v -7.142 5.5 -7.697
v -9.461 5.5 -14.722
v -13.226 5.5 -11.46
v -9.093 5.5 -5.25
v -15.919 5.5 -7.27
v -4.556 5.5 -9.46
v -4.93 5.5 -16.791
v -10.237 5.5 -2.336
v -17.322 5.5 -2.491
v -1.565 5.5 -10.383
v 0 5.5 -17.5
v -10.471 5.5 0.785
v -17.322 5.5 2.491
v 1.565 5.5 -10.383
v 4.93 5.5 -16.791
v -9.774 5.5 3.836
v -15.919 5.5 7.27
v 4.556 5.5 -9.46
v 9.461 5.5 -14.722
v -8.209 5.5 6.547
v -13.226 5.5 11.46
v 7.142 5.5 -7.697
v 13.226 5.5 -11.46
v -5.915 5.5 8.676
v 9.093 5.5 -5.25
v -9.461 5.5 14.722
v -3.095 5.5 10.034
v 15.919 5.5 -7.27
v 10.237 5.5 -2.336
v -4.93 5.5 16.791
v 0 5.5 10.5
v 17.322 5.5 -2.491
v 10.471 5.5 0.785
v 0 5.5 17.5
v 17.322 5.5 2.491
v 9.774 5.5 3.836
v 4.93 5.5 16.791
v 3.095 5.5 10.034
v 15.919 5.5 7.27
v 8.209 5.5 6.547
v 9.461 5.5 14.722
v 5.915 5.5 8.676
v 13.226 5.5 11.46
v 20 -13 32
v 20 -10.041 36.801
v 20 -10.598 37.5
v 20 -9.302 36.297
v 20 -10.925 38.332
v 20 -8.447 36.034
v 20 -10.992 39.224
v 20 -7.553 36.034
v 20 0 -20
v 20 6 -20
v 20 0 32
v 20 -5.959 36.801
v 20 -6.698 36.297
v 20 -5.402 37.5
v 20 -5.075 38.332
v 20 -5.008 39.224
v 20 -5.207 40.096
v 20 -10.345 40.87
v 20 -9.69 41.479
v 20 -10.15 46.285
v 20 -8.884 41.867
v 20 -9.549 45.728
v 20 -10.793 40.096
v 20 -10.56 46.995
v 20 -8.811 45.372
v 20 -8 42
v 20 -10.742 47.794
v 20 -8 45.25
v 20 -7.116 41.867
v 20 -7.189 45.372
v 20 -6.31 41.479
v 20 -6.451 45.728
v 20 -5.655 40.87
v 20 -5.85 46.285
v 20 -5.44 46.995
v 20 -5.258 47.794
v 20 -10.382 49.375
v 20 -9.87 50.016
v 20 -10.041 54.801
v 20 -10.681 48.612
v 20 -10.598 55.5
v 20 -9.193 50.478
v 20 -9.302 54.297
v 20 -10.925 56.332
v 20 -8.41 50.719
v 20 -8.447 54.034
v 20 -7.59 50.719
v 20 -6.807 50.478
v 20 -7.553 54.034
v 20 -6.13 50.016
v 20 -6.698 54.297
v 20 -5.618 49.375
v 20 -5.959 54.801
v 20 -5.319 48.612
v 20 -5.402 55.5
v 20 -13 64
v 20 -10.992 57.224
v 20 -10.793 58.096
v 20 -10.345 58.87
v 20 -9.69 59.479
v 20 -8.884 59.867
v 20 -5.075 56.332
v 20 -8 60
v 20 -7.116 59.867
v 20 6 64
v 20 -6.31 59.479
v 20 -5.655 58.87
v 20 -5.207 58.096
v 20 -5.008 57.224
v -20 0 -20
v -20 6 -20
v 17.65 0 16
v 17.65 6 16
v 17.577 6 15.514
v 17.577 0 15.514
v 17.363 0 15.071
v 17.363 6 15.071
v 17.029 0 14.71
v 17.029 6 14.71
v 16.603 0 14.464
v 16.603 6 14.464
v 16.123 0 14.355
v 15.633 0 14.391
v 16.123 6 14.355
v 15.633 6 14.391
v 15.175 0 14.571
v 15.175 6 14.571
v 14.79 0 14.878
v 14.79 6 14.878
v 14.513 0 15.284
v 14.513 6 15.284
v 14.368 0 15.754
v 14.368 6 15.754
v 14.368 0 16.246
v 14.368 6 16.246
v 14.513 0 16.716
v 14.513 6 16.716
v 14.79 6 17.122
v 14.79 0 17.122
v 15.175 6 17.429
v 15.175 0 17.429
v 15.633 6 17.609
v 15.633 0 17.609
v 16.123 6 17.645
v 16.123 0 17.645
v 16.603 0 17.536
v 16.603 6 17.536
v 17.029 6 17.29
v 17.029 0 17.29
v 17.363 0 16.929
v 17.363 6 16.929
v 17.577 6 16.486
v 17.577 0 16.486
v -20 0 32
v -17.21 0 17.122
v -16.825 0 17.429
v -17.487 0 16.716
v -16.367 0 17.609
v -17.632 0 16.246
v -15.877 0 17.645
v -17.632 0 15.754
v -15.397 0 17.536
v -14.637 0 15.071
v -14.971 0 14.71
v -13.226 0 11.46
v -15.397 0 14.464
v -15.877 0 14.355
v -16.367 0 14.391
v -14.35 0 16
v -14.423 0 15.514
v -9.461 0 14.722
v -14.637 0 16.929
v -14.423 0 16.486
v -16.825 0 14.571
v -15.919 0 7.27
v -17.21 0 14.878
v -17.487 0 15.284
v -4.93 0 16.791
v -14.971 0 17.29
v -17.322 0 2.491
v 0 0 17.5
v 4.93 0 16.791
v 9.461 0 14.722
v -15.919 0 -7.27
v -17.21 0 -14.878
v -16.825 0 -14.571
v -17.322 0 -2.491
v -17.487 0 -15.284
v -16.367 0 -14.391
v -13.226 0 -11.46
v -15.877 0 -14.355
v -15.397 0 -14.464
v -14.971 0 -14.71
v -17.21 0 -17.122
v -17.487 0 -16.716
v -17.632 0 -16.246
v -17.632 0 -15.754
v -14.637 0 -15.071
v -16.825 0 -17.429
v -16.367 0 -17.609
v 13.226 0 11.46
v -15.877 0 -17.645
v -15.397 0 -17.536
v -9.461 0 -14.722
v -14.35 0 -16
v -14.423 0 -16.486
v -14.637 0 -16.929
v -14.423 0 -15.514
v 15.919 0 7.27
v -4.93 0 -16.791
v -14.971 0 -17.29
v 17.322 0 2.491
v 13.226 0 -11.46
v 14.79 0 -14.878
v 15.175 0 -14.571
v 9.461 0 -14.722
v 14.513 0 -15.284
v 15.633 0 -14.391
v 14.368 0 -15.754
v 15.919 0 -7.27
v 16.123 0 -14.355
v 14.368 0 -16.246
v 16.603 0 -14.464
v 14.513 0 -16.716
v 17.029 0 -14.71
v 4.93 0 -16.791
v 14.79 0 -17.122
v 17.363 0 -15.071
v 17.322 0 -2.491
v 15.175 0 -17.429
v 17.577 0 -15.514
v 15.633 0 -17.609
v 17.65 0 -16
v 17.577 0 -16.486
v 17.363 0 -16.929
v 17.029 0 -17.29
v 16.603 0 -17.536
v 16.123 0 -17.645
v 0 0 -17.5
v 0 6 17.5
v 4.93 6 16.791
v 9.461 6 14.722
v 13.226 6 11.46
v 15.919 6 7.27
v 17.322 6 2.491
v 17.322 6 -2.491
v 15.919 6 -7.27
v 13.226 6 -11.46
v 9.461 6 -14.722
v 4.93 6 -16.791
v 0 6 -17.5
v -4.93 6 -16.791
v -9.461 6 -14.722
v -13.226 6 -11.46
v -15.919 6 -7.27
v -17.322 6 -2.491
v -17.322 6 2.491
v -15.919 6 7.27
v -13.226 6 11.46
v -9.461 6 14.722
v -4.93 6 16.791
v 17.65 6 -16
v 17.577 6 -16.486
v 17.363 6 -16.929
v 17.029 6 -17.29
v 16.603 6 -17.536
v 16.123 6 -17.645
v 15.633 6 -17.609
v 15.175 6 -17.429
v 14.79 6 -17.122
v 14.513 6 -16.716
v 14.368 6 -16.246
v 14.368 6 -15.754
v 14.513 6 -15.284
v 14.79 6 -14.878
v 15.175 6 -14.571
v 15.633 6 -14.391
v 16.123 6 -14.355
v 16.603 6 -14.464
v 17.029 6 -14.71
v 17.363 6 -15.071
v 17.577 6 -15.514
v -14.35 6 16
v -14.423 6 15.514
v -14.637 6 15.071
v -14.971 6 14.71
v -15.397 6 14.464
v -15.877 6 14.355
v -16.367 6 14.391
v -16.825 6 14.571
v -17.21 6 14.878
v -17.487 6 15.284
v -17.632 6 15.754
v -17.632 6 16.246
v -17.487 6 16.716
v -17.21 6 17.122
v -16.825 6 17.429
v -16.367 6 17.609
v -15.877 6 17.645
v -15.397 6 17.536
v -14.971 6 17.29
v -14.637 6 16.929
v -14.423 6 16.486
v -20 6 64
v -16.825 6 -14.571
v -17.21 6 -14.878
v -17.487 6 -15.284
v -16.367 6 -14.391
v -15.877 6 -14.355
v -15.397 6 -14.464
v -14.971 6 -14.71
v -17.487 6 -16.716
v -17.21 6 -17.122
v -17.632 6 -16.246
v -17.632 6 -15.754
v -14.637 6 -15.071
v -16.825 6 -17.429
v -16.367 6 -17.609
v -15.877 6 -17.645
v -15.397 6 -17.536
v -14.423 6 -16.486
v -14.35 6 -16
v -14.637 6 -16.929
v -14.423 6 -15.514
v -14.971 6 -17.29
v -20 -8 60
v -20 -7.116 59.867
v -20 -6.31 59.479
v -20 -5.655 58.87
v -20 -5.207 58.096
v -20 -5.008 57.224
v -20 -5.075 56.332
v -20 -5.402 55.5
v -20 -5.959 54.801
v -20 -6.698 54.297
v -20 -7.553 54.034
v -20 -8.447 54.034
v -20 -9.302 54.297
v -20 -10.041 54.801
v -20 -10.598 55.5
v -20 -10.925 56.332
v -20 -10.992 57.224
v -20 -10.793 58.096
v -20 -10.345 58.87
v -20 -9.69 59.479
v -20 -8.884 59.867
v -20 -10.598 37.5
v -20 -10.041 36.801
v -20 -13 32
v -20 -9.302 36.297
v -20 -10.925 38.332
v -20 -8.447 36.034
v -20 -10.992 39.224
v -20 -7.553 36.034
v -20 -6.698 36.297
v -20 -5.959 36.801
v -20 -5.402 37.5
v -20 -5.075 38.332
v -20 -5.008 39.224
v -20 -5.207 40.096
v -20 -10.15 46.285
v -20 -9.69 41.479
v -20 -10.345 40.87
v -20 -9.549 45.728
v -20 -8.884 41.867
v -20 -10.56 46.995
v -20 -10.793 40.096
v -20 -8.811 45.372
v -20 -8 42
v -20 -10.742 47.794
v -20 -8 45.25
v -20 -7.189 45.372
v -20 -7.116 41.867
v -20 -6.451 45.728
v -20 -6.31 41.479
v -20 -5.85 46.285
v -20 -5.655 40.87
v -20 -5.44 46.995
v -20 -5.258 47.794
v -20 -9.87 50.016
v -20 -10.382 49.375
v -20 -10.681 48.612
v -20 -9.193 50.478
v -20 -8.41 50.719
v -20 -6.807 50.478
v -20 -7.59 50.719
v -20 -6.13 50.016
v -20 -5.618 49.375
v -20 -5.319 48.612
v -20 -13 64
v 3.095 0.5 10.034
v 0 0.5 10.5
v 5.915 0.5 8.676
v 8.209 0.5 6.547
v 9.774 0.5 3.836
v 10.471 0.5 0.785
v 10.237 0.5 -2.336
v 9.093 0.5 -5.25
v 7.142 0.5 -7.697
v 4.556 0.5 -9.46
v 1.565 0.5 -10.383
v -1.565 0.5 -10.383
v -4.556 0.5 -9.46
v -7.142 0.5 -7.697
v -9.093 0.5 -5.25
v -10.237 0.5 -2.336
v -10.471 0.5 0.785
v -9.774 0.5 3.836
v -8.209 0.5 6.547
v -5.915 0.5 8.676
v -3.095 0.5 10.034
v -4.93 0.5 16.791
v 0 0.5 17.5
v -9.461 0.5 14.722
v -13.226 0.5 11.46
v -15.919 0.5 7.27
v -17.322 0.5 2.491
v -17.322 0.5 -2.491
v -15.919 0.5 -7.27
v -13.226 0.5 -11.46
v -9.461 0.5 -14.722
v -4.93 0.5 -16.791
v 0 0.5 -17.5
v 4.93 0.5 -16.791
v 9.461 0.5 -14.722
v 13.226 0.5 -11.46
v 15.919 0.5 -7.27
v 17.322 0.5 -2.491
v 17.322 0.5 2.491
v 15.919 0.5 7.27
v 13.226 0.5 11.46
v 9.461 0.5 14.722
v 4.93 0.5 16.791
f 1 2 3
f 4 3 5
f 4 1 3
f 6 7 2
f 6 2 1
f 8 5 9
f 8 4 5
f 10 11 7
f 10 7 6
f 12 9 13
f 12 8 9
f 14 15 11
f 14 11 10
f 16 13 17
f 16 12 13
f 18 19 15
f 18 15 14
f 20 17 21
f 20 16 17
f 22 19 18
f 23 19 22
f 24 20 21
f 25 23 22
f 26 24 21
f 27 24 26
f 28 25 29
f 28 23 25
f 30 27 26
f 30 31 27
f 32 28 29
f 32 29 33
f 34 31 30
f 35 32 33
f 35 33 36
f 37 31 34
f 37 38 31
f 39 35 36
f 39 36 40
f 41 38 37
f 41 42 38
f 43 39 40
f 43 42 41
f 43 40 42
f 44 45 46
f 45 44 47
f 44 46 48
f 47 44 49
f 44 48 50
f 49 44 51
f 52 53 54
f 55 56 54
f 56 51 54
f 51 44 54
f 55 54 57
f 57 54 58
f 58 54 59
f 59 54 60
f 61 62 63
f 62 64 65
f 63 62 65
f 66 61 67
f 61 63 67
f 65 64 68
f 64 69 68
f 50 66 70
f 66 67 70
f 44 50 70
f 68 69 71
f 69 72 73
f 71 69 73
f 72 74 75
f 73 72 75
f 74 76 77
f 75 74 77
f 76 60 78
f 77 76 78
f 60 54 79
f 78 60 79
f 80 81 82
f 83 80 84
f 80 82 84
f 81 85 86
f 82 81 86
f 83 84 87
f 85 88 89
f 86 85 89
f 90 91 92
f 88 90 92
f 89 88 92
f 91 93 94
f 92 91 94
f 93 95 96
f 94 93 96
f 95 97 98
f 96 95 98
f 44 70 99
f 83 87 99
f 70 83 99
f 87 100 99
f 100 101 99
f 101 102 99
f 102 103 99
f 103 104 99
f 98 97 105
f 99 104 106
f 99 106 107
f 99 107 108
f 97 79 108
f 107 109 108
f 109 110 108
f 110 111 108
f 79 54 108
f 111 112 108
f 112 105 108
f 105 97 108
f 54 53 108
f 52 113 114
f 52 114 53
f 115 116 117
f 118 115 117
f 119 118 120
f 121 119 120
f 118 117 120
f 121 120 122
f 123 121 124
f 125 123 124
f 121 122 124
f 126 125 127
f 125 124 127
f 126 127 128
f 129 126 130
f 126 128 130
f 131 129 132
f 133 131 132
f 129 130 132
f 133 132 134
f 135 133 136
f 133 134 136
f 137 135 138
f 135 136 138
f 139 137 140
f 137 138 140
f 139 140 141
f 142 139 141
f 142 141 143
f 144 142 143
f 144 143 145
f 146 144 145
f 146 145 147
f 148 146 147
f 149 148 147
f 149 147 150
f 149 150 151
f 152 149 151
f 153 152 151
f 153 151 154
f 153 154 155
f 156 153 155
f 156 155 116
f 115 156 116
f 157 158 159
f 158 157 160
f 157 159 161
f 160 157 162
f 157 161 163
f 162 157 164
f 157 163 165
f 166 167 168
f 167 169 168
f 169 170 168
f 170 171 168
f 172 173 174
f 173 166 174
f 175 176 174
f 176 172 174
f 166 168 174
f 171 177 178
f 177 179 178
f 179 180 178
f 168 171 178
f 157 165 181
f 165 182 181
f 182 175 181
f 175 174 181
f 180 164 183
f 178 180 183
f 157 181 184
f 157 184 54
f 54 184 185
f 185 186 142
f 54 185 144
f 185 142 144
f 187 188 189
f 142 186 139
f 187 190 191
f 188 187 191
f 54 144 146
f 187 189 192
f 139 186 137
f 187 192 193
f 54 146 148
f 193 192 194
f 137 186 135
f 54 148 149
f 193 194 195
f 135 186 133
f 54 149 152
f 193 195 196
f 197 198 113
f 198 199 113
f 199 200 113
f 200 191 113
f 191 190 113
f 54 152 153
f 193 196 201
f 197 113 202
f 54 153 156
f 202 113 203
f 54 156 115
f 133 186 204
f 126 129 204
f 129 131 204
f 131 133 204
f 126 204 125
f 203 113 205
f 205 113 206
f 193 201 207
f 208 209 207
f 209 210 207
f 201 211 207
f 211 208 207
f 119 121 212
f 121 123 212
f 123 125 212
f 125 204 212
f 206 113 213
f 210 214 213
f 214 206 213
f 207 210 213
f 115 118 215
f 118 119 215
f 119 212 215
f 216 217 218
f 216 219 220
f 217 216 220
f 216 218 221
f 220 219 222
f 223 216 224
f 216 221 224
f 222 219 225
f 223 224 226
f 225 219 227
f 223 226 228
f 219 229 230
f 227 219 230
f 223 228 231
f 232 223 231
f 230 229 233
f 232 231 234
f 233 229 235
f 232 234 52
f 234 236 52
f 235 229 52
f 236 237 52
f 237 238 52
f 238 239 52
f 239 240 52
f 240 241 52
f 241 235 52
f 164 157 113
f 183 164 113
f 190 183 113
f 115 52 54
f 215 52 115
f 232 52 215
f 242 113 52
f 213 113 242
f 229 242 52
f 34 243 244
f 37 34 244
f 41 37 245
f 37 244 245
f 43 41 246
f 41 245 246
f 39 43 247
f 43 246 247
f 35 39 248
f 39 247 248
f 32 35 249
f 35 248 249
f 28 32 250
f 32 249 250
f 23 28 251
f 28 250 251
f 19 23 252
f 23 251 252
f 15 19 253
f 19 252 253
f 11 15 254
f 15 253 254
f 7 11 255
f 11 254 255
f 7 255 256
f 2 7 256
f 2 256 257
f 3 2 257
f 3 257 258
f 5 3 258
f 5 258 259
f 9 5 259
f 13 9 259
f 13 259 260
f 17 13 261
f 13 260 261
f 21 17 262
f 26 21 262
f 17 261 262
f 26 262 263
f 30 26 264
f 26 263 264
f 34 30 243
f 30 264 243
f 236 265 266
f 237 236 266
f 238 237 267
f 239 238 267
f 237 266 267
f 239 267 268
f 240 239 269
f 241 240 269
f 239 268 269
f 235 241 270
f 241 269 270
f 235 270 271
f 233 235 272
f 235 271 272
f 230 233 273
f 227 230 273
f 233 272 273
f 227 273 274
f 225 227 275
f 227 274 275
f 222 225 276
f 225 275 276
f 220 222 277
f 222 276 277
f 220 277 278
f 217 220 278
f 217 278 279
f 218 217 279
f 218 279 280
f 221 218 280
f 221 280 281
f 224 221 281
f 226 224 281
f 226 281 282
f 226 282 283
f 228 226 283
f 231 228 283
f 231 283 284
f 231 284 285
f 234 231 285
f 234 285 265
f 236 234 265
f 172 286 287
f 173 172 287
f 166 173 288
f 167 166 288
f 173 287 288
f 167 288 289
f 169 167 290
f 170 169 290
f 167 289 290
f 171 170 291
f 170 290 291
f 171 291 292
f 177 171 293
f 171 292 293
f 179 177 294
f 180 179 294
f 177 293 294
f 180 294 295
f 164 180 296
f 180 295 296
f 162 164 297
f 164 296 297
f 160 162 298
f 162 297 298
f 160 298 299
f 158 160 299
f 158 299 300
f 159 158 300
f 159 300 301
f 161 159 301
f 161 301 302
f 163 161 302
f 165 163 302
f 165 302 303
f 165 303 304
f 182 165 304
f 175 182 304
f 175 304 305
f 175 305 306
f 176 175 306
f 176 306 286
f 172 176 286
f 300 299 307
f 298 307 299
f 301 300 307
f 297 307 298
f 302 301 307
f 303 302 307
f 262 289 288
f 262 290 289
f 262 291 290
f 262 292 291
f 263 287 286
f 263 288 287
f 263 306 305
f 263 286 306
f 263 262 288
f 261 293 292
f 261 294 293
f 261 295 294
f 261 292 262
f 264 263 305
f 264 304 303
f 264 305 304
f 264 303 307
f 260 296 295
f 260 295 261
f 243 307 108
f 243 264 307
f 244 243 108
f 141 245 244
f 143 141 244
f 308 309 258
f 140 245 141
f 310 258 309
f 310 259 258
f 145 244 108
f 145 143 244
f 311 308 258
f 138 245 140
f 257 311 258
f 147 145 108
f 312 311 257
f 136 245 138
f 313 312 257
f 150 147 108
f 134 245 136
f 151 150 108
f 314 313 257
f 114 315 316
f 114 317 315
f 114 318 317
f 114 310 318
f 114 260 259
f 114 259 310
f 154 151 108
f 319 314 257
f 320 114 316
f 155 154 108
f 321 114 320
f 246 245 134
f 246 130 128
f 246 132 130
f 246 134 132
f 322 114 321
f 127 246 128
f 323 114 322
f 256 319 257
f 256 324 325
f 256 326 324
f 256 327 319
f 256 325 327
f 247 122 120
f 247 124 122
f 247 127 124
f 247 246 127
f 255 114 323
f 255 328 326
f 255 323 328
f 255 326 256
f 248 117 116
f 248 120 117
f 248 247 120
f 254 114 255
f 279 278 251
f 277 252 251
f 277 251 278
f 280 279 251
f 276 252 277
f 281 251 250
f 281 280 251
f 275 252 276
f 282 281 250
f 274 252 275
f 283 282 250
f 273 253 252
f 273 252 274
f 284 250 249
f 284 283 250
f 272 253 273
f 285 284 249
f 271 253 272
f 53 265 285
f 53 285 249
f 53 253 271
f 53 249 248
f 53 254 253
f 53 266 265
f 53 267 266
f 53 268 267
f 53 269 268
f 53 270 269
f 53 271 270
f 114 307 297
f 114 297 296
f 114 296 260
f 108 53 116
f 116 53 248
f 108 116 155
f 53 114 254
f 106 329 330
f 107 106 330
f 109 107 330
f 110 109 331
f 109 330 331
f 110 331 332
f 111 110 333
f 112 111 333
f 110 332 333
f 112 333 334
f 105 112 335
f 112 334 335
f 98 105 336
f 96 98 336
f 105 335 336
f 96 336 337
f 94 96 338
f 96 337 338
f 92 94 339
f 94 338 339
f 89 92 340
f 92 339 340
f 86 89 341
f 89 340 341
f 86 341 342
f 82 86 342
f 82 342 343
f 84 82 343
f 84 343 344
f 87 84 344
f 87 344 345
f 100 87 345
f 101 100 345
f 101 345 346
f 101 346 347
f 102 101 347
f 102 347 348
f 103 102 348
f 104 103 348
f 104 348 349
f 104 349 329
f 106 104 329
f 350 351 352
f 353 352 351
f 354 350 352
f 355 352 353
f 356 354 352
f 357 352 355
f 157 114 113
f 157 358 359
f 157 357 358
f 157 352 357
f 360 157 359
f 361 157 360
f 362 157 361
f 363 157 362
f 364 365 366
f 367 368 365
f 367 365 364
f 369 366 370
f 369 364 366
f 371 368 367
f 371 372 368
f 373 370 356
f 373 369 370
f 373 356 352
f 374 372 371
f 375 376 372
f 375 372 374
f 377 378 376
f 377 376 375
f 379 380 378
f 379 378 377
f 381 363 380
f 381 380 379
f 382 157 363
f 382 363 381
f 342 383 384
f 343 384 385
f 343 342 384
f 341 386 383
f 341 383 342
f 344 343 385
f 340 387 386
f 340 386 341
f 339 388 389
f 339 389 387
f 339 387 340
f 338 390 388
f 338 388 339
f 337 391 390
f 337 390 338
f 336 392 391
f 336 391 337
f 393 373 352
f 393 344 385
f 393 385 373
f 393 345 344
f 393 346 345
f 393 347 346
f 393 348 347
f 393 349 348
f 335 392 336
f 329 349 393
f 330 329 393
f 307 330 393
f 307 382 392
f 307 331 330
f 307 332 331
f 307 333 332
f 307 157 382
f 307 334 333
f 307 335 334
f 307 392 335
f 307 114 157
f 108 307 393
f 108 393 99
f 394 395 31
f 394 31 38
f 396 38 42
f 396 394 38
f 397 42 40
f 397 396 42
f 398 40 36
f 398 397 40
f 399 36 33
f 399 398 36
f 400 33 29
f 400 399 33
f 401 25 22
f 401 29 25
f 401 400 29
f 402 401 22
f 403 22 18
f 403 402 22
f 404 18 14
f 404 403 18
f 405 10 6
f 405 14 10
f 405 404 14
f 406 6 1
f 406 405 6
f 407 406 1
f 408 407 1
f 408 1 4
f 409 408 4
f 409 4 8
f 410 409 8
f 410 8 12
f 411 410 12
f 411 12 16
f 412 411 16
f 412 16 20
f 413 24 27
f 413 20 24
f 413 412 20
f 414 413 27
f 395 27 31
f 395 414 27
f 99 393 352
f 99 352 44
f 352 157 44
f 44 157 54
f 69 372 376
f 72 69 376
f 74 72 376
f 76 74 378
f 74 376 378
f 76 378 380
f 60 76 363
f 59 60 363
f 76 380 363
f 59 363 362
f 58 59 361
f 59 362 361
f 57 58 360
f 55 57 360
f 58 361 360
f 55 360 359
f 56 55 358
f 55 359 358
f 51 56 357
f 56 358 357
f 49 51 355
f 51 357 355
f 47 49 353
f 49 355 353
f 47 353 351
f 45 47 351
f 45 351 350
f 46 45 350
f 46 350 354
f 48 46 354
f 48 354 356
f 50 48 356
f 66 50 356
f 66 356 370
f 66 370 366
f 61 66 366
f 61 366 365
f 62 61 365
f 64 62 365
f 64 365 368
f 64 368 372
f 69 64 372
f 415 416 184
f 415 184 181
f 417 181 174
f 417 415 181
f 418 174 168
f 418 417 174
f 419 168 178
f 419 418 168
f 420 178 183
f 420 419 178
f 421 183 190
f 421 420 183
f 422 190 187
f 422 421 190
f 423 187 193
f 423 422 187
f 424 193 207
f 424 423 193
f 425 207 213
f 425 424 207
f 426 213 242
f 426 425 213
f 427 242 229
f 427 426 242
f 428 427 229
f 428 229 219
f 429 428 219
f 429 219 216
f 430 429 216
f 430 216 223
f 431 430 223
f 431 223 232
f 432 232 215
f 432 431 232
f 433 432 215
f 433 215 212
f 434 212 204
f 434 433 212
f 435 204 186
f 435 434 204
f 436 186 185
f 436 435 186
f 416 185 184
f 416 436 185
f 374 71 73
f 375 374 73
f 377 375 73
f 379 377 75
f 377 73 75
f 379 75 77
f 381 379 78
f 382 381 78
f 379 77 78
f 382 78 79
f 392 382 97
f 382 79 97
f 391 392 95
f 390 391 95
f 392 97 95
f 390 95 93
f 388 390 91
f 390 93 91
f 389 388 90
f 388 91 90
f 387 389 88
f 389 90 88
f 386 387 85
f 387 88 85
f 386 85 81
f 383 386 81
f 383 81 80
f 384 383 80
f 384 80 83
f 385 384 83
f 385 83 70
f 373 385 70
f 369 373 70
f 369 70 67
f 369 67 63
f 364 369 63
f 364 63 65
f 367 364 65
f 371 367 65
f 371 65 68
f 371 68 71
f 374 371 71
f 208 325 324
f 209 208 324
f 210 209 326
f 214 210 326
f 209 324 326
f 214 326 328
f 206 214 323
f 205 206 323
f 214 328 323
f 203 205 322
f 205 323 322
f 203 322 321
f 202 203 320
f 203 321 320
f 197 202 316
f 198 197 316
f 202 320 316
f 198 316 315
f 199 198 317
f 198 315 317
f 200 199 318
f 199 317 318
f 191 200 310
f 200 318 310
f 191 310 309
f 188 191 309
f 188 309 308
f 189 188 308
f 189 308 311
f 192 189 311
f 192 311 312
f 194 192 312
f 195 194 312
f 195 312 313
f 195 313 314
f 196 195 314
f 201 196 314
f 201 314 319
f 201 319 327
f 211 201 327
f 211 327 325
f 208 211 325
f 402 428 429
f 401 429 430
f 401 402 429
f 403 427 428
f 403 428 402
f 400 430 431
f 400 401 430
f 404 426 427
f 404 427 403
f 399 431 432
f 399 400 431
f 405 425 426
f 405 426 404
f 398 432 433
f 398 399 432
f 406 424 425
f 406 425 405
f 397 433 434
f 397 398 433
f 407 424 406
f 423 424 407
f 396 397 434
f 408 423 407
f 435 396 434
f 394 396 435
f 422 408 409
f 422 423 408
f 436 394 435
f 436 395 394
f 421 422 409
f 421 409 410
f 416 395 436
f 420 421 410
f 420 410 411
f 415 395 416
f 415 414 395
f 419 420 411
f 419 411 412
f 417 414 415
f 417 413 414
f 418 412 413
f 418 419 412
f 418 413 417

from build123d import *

# Parameters (mm, degrees)
SKETCH1_W             = 40
SKETCH1_H             = 84
SKETCH1_R             = 10.5
BOSS_EXTRUDE1_DEPTH   = 6
SKETCH2_W             = 40
SKETCH2_H             = 32
BOSS_EXTRUDE2_DEPTH   = 13
F_6_0MM_DOWEL_HOLE1_D = 6
M5_CLEARANCE_HOLE1_D  = 5.5
M4X0_7_TAPPED_HOLE1_D = 3.3
SKETCH12_R            = 17.5
CUT_EXTRUDE1_DEPTH    = 0.5
CUT_EXTRUDE2_START    = -0.5
SKETCH13_R            = 17.5
CUT_EXTRUDE2_DEPTH    = 0.5


with BuildPart() as part:
    # Sketch1 → Boss-Extrude1 (new body)
    with BuildSketch(Plane(origin=(0, 0, 0), x_dir=(1, 0, 0), z_dir=(0, 1, 0))):
        with Locations((0, -22)):
            Rectangle(SKETCH1_W, SKETCH1_H)
        with Locations(Location((0, 0, 0), (0, 0, 270))):
            Circle(SKETCH1_R, mode=Mode.SUBTRACT)
    extrude(amount=BOSS_EXTRUDE1_DEPTH)

    # Sketch2 → Boss-Extrude2 (add)
    with BuildSketch(Plane.XZ):
        with Locations((0, 48)):
            Rectangle(SKETCH2_W, SKETCH2_H)
    extrude(amount=BOSS_EXTRUDE2_DEPTH)

    # Ø6.0mm Dowel Hole1 (through all)
    with Locations(Plane(origin=(20, 0, 0), x_dir=(0, 0, -1), z_dir=(1, 0, 0))):
        with Locations((-57, -8), (-39, -8)):
            Hole(F_6_0MM_DOWEL_HOLE1_D / 2)

    # M5 Clearance Hole1 (through all)
    with Locations(Plane.ZY.offset(20)):
        with Locations((48, -8)):
            Hole(M5_CLEARANCE_HOLE1_D / 2)

    # M4x0.7 Tapped Hole1 (through all)
    with Locations(Plane(origin=(0, 0, 0), x_dir=(-1, 0, 0), z_dir=(0, -1, 0))):
        with Locations((16, 16), (-16, 16), (-16, -16), (16, -16)):
            Hole(M4X0_7_TAPPED_HOLE1_D / 2)

    # Sketch12 → Cut-Extrude1 (cut)
    with BuildSketch(Plane(origin=(0, 6, 0), x_dir=(1, 0, 0), z_dir=(0, 1, 0))):
        with Locations(Location((0, 0, 0), (0, 0, 270))):
            Circle(SKETCH12_R)
    extrude(amount=-CUT_EXTRUDE1_DEPTH, mode=Mode.SUBTRACT)

    # Sketch13 → Cut-Extrude2 (cut)
    with BuildSketch(Plane.XZ.offset(CUT_EXTRUDE2_START)):
        with Locations(Location((0, 0, 0), (0, 0, 90))):
            Circle(SKETCH13_R)
    extrude(amount=CUT_EXTRUDE2_DEPTH, mode=Mode.SUBTRACT)


solid = part.part
